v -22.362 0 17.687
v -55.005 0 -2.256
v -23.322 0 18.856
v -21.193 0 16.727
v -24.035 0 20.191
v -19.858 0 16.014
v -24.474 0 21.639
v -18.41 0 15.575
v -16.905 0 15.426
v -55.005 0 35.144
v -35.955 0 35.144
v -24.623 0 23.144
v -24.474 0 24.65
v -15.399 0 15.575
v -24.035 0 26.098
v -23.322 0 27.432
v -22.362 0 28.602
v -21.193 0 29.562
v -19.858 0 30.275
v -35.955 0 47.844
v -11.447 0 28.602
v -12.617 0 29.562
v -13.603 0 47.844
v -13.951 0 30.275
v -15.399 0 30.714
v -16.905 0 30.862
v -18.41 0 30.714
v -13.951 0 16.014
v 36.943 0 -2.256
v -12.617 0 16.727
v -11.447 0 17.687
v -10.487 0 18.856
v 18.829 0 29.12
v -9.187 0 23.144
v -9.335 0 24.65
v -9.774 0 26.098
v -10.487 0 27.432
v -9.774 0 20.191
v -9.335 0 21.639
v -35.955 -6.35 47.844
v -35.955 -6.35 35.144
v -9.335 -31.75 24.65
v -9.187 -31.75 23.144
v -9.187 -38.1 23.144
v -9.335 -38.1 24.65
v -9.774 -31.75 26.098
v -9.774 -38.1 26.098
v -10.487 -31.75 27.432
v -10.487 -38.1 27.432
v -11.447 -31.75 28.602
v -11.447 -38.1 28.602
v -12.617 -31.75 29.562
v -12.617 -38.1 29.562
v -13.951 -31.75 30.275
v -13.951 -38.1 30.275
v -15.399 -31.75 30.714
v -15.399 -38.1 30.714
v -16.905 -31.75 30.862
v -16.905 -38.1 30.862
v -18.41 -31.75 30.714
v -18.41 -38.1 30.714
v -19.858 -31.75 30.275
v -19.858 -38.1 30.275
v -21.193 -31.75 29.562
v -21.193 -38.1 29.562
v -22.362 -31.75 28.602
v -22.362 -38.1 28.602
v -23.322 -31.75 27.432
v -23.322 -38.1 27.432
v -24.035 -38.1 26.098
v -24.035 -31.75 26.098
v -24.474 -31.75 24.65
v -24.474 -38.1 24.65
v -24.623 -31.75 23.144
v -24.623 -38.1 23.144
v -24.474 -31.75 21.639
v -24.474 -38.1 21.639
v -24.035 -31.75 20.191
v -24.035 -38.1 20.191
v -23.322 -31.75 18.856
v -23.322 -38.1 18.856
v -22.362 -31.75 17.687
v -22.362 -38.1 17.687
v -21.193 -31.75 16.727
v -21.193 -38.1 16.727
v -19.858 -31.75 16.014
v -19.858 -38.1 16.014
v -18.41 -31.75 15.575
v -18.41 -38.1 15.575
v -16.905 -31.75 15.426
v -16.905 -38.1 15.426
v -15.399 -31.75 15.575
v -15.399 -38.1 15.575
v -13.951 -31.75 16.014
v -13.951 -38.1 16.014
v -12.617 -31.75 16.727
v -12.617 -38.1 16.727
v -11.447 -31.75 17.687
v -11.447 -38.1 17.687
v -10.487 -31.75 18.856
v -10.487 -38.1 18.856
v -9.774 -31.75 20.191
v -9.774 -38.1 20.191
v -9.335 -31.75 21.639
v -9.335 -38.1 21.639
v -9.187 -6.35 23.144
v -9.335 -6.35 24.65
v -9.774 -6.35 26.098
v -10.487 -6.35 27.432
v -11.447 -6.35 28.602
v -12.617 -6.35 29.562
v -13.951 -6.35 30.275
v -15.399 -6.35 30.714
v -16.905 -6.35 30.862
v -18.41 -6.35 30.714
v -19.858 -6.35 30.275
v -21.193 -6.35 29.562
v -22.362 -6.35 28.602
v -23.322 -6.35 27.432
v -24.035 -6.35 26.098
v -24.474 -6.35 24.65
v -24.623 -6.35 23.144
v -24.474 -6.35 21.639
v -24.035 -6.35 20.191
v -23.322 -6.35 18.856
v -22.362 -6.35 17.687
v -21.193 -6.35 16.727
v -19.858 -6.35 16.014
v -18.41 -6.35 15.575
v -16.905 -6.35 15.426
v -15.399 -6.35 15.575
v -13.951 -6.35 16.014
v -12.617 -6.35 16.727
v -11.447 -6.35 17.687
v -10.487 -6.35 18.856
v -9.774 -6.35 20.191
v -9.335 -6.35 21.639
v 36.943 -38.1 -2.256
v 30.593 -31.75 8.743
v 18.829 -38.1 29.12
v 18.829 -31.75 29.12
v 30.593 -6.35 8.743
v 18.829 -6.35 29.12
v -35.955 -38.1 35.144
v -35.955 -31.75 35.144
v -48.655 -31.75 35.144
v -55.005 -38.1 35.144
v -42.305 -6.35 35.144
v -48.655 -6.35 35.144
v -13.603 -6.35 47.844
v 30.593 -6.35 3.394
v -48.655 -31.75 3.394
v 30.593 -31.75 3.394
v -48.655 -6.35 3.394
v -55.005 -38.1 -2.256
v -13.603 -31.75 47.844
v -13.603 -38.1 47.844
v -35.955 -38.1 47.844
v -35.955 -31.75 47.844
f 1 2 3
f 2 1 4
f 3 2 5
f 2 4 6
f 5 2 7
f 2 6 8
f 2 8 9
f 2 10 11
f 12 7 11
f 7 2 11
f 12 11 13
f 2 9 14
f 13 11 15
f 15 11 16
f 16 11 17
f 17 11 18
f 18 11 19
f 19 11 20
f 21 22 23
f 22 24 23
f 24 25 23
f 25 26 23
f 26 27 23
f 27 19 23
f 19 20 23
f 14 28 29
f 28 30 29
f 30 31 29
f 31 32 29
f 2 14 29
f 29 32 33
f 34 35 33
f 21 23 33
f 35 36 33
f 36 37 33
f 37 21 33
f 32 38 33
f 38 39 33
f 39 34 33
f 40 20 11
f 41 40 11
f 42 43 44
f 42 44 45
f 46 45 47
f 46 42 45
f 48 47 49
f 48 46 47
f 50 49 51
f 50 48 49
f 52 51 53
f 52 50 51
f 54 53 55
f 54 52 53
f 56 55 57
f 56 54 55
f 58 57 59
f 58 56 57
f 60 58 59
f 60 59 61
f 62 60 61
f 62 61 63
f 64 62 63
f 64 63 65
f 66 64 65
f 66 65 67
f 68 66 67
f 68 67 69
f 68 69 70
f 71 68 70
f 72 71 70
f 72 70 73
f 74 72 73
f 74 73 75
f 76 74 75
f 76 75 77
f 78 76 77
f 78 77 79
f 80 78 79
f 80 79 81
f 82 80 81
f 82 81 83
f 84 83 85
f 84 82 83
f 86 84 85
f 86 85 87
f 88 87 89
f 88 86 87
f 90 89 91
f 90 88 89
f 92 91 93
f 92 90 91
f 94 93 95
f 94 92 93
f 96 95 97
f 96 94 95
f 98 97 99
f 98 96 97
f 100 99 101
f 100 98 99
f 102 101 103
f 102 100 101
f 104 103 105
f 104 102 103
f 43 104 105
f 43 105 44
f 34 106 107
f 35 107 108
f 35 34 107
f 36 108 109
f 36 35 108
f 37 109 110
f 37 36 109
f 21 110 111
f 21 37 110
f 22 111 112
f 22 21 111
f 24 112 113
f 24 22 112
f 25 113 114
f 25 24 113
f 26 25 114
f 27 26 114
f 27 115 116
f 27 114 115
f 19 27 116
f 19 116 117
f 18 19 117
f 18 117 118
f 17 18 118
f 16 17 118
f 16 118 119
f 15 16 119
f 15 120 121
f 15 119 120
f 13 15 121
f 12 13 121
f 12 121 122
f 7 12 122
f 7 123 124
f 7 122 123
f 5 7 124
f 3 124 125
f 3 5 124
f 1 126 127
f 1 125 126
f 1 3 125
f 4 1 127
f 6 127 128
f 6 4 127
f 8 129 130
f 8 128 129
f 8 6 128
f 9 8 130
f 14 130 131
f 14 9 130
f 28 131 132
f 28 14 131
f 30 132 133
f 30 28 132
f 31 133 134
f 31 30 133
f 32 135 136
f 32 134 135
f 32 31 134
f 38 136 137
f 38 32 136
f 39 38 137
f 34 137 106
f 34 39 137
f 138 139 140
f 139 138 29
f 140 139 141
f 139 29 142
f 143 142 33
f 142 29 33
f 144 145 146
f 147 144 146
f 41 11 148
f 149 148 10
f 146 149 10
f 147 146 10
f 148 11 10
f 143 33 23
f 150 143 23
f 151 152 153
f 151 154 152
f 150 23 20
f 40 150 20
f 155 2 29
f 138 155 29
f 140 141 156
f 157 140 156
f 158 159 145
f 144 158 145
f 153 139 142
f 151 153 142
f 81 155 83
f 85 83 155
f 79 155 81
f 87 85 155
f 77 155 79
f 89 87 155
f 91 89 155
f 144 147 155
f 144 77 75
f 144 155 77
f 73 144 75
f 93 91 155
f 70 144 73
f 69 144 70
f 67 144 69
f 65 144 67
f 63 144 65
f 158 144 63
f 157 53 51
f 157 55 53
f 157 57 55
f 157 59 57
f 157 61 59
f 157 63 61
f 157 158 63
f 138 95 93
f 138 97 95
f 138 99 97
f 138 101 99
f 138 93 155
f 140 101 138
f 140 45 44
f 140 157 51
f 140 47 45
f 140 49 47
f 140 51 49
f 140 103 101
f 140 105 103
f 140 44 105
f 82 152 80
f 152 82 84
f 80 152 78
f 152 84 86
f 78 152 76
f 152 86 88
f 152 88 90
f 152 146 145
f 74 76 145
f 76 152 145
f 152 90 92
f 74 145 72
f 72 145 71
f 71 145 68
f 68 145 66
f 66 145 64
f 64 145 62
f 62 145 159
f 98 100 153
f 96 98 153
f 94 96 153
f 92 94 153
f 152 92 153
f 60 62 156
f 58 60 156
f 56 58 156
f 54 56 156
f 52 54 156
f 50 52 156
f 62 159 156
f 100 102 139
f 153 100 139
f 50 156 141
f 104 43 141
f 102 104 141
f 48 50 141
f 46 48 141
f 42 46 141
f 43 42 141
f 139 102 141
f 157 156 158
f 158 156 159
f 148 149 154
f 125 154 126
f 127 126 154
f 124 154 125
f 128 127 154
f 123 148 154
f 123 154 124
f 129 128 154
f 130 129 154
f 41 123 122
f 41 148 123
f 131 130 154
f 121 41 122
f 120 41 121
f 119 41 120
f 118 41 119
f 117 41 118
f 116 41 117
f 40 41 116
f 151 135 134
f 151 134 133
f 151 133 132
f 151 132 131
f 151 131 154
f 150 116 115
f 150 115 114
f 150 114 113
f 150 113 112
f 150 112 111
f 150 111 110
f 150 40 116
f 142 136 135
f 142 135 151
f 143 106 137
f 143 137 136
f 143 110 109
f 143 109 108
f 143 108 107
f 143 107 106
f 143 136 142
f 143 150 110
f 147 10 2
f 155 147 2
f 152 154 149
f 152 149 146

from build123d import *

# Parameters (mm, degrees)
F0_R     = 7.7179968939
F1_DEPTH = 38.1
F2_W     = 6.3499980524
F2_H     = 3.8099980524
F2_H_2   = 5.3974985393
F3_DEPTH = 12.7
F4_W     = 79.248
F4_H     = 25.4
F5_DEPTH = 44.45


with BuildPart() as f1:
    # F0 (on Front) → F1 (new body)
    with BuildSketch(Plane.XZ):
        Polygon((-13.60275174, 47.8438777382), (-35.95475174, 47.8438777382), (-35.95475174, 35.1438777382), (-55.00475174, 35.1438777382), (-55.00475174, -2.255679107), (36.94324826, -2.255679107), (18.8287593137, 29.1195361012), align=None)
        with Locations((-16.90475174, 23.144320893)):
            Circle(F0_R, mode=Mode.SUBTRACT)
    extrude(amount=F1_DEPTH)

    # F2 (on face) → F3 (join)
    with BuildSketch(Plane.XY.offset(35.1438777382)):
        with Locations((-45.4797527138, -29.8450009738)):
            Rectangle(F2_W, F2_H)
        with Locations((-45.4797527138, -9.0487492696)):
            Rectangle(F2_W, F2_H_2)
    extrude(amount=F3_DEPTH)

    # F4 (on face) → F5 (cut)
    with BuildSketch(Plane.XY.offset(47.8438777382)):
        with Locations((-9.03075174, -19.05)):
            Rectangle(F4_W, F4_H)
        Polygon((-42.3047536876, -27.9400019476), (-42.3047536876, -31.75), (30.59324826, -31.75), (30.59324826, -6.35), (-48.65475174, -6.35), (-48.65475174, -27.9400019476), align=None)
    extrude(amount=-F5_DEPTH, mode=Mode.SUBTRACT)


solid = f1.part
